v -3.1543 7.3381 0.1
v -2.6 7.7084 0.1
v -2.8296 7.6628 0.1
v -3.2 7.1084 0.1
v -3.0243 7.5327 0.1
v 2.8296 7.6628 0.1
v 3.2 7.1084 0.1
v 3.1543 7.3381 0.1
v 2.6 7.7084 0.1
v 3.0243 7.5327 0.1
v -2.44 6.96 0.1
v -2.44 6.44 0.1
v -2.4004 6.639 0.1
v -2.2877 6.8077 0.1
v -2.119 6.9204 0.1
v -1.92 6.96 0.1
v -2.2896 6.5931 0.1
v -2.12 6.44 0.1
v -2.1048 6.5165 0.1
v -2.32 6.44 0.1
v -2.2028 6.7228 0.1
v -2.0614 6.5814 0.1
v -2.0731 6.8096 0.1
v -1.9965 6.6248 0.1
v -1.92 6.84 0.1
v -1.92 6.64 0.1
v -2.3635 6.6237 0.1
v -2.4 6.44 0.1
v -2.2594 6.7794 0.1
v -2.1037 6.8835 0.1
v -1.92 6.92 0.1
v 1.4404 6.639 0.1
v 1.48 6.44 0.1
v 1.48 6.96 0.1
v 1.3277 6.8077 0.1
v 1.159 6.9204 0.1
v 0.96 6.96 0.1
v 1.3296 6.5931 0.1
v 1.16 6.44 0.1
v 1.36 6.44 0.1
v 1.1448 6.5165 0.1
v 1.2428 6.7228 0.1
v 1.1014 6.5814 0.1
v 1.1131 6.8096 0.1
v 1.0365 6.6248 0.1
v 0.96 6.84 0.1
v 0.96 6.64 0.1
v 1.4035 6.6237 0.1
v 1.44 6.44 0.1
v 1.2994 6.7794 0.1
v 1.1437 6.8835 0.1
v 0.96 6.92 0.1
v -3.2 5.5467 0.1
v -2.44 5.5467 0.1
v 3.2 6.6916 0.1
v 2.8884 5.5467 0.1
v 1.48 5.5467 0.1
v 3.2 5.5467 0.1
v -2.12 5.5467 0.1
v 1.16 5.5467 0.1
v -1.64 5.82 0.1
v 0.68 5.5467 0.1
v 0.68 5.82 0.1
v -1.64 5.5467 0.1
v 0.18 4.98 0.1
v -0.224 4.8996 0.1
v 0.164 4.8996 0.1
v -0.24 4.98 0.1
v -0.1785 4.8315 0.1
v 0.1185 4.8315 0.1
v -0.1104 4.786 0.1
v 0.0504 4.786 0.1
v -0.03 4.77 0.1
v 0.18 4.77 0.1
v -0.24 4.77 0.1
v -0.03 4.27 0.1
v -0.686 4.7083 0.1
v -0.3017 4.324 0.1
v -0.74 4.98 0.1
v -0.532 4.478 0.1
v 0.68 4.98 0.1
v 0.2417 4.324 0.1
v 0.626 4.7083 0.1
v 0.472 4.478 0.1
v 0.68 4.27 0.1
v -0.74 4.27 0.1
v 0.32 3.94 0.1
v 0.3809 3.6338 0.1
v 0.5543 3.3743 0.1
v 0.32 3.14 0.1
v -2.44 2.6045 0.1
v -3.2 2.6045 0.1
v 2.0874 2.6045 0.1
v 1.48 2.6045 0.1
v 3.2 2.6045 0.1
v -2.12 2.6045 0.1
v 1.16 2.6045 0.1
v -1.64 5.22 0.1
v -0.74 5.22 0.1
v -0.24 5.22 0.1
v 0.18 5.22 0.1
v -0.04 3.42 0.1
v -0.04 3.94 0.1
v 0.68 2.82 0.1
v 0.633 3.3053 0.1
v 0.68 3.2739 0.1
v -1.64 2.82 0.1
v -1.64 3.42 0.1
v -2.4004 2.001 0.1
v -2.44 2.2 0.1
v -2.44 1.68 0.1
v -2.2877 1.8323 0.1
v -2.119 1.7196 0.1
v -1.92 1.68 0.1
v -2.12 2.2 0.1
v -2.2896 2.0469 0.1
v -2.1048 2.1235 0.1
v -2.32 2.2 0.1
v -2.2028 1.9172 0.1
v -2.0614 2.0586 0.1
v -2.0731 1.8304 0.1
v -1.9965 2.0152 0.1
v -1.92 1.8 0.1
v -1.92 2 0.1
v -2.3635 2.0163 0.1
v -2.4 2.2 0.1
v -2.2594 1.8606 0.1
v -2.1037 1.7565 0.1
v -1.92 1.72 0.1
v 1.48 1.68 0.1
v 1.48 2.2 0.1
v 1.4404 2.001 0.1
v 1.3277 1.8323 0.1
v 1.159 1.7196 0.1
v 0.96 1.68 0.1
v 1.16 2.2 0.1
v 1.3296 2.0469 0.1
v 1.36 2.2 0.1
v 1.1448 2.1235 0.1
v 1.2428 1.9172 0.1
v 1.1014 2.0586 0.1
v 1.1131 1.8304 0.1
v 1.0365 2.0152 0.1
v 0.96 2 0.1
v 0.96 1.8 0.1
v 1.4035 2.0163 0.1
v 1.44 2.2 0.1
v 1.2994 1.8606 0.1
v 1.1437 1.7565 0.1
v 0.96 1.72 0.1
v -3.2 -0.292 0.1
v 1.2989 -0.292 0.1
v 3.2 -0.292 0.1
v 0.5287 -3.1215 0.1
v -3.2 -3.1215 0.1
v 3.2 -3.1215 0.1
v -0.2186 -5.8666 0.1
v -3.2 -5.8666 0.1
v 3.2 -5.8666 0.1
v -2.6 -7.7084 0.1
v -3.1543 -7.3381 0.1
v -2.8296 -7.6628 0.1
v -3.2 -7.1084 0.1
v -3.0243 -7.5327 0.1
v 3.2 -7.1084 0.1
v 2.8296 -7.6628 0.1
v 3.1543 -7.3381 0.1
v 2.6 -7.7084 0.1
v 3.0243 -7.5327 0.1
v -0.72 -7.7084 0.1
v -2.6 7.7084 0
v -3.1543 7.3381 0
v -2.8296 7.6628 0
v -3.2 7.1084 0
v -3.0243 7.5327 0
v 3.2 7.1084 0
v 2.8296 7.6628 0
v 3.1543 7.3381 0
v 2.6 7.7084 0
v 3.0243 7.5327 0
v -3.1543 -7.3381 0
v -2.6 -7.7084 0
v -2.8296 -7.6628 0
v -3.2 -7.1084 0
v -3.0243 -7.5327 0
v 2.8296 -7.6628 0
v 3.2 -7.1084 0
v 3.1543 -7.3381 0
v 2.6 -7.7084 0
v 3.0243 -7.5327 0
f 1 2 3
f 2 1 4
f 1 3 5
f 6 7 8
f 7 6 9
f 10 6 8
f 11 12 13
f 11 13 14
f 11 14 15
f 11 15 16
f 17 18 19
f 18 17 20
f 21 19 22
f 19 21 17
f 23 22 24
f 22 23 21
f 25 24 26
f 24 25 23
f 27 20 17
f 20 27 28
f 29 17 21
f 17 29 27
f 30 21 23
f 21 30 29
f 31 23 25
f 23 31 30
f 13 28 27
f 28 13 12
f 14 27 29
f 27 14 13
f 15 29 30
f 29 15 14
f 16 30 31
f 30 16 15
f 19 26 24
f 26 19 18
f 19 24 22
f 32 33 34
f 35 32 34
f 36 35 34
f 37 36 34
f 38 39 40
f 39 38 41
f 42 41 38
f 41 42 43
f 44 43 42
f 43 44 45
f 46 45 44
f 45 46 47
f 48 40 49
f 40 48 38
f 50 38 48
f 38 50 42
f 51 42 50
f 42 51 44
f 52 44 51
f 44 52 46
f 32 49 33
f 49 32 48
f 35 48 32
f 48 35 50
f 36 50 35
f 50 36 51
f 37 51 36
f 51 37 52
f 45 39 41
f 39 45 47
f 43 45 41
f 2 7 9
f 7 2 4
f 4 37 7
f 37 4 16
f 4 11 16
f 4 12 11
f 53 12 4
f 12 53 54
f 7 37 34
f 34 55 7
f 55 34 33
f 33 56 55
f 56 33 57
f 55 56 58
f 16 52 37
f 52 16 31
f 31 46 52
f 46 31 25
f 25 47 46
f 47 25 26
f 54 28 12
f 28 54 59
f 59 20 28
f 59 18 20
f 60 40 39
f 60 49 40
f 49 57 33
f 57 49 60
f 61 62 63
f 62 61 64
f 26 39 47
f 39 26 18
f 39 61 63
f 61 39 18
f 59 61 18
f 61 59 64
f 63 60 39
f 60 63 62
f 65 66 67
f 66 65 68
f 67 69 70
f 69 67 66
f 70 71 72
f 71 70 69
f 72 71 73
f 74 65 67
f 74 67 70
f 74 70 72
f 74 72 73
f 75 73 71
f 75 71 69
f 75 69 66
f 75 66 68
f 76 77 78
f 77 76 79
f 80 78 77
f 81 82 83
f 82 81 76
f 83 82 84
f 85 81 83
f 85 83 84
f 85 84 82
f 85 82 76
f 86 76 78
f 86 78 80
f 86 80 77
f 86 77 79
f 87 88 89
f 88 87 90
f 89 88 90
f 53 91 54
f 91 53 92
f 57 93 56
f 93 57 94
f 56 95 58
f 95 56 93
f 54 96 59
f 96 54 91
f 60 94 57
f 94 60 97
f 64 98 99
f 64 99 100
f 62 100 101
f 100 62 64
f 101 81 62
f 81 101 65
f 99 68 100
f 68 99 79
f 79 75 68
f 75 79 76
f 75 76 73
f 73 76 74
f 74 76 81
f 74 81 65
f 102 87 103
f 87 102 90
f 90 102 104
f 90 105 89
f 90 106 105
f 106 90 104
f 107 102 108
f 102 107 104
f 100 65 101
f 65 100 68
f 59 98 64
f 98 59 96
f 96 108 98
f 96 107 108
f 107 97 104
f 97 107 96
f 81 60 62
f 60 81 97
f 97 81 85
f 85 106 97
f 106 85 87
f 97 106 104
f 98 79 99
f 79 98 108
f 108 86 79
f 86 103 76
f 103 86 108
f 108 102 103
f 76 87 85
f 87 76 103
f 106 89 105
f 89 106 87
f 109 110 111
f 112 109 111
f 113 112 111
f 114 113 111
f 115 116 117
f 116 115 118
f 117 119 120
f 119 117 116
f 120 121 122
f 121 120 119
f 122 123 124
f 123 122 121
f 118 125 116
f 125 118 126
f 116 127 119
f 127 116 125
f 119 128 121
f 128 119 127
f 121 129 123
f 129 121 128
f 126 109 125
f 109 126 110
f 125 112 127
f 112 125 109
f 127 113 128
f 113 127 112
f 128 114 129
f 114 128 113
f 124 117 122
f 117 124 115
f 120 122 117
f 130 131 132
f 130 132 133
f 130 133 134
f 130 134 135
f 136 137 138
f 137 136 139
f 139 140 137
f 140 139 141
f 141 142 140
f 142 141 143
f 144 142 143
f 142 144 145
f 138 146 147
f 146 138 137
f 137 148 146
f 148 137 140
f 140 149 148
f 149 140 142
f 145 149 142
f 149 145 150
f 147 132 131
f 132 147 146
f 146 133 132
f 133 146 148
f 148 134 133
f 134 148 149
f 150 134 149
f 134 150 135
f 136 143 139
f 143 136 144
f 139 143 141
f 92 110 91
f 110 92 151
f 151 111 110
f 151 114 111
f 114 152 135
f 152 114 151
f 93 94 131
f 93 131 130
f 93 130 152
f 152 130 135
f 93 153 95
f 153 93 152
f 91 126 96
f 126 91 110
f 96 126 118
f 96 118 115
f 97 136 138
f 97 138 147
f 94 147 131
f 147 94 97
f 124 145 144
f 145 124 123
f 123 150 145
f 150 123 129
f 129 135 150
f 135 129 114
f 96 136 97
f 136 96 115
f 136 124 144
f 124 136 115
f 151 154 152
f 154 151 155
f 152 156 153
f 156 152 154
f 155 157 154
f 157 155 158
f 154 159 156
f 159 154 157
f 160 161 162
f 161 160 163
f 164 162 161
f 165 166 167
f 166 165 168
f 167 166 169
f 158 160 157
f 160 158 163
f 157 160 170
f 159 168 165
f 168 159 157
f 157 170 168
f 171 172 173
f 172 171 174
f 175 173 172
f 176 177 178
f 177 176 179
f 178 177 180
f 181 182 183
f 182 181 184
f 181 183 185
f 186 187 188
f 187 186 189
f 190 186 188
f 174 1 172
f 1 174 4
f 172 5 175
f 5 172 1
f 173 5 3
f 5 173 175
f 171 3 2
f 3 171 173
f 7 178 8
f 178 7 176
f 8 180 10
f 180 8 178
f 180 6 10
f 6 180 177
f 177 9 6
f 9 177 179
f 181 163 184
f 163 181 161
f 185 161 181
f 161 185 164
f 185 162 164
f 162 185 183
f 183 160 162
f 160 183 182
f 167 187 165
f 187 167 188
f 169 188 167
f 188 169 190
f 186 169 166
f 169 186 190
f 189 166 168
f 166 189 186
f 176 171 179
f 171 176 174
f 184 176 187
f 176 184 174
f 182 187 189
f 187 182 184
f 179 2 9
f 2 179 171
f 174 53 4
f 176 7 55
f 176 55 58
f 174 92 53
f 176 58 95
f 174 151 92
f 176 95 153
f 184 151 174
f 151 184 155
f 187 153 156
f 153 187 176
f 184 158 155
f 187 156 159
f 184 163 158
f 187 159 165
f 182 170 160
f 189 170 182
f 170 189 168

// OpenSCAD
use <../lib.scad>
use <s/6142275zs01.scad>
use <s/6142275zs02.scad>
use <s/6142275zs03.scad>
use <s/6142275zs04.scad>
use <s/6142275zs05.scad>
use <s/6142275zs06.scad>
use <s/6142275zs07.scad>
function ldraw_lib__6142275z() = [
// 0 Sticker  1.9 x  0.8 with Red "P1" and Grey Triangle on Black Background Right
// 0 Name: 6142275z.dat
// 0 Author: Massimo Maso [Sirio]
// 0 !LDRAW_ORG Part UPDATE 2023-05
// 0 !LICENSE Licensed under CC BY 4.0 : see CAreadme.txt
// 
// 0 BFC CERTIFY CCW
  [0,"BFC","CERTIFY"],
  [0,"BFC","CCW"],
// 
// 0 !KEYWORDS Audi, e-tron, quattro, R18, Set 75872, Speed Champions
// 
// 0 !HISTORY 2023-10-31 [OrionP] Official Update 2023-05
// 
// 
// 1 16 0 0 13.8789 1 0 0 0 1 0 0 0 1 s\6142275zs01.dat
  [1,16,0,0,13.8789,1,0,0,0,1,0,0,0,1, ldraw_lib__s__6142275zs01()],
// 1 16 0 0 13.8547 1 0 0 0 1 0 0 0 1 s\6142275zs02.dat
  [1,16,0,0,13.8547,1,0,0,0,1,0,0,0,1, ldraw_lib__s__6142275zs02()],
// 1 16 0 0 -.7172 1 0 0 0 1 0 0 0 1 s\6142275zs03.dat
  [1,16,0,0,-.7172,1,0,0,0,1,0,0,0,1, ldraw_lib__s__6142275zs03()],
// 1 16 0 0 -.7428 1 0 0 0 1 0 0 0 1 s\6142275zs04.dat
  [1,16,0,0,-.7428,1,0,0,0,1,0,0,0,1, ldraw_lib__s__6142275zs04()],
// 1 16 0 0 -14.6522 1 0 0 0 1 0 0 0 1 s\6142275zs05.dat
  [1,16,0,0,-14.6522,1,0,0,0,1,0,0,0,1, ldraw_lib__s__6142275zs05()],
// 1 16 0 0 -14.6810 1 0 0 0 1 0 0 0 1 s\6142275zs06.dat
  [1,16,0,0,-14.6810,1,0,0,0,1,0,0,0,1, ldraw_lib__s__6142275zs06()],
// 1 16 0 0 0 1 0 0 0 1 0 0 0 1 s\6142275zs07.dat
  [1,16,0,0,0,1,0,0,0,1,0,0,0,1, ldraw_lib__s__6142275zs07()],
];
module ldraw_lib__6142275z(step=0, col=false, unit=2/5, alt=false, line=0.2, solid=!$preview)
    makepoly(ldraw_lib__6142275z(), step=step, col=col, unit=unit, alt=alt, line=line, solid=solid);
ldraw_lib__6142275z(line=0.2);
